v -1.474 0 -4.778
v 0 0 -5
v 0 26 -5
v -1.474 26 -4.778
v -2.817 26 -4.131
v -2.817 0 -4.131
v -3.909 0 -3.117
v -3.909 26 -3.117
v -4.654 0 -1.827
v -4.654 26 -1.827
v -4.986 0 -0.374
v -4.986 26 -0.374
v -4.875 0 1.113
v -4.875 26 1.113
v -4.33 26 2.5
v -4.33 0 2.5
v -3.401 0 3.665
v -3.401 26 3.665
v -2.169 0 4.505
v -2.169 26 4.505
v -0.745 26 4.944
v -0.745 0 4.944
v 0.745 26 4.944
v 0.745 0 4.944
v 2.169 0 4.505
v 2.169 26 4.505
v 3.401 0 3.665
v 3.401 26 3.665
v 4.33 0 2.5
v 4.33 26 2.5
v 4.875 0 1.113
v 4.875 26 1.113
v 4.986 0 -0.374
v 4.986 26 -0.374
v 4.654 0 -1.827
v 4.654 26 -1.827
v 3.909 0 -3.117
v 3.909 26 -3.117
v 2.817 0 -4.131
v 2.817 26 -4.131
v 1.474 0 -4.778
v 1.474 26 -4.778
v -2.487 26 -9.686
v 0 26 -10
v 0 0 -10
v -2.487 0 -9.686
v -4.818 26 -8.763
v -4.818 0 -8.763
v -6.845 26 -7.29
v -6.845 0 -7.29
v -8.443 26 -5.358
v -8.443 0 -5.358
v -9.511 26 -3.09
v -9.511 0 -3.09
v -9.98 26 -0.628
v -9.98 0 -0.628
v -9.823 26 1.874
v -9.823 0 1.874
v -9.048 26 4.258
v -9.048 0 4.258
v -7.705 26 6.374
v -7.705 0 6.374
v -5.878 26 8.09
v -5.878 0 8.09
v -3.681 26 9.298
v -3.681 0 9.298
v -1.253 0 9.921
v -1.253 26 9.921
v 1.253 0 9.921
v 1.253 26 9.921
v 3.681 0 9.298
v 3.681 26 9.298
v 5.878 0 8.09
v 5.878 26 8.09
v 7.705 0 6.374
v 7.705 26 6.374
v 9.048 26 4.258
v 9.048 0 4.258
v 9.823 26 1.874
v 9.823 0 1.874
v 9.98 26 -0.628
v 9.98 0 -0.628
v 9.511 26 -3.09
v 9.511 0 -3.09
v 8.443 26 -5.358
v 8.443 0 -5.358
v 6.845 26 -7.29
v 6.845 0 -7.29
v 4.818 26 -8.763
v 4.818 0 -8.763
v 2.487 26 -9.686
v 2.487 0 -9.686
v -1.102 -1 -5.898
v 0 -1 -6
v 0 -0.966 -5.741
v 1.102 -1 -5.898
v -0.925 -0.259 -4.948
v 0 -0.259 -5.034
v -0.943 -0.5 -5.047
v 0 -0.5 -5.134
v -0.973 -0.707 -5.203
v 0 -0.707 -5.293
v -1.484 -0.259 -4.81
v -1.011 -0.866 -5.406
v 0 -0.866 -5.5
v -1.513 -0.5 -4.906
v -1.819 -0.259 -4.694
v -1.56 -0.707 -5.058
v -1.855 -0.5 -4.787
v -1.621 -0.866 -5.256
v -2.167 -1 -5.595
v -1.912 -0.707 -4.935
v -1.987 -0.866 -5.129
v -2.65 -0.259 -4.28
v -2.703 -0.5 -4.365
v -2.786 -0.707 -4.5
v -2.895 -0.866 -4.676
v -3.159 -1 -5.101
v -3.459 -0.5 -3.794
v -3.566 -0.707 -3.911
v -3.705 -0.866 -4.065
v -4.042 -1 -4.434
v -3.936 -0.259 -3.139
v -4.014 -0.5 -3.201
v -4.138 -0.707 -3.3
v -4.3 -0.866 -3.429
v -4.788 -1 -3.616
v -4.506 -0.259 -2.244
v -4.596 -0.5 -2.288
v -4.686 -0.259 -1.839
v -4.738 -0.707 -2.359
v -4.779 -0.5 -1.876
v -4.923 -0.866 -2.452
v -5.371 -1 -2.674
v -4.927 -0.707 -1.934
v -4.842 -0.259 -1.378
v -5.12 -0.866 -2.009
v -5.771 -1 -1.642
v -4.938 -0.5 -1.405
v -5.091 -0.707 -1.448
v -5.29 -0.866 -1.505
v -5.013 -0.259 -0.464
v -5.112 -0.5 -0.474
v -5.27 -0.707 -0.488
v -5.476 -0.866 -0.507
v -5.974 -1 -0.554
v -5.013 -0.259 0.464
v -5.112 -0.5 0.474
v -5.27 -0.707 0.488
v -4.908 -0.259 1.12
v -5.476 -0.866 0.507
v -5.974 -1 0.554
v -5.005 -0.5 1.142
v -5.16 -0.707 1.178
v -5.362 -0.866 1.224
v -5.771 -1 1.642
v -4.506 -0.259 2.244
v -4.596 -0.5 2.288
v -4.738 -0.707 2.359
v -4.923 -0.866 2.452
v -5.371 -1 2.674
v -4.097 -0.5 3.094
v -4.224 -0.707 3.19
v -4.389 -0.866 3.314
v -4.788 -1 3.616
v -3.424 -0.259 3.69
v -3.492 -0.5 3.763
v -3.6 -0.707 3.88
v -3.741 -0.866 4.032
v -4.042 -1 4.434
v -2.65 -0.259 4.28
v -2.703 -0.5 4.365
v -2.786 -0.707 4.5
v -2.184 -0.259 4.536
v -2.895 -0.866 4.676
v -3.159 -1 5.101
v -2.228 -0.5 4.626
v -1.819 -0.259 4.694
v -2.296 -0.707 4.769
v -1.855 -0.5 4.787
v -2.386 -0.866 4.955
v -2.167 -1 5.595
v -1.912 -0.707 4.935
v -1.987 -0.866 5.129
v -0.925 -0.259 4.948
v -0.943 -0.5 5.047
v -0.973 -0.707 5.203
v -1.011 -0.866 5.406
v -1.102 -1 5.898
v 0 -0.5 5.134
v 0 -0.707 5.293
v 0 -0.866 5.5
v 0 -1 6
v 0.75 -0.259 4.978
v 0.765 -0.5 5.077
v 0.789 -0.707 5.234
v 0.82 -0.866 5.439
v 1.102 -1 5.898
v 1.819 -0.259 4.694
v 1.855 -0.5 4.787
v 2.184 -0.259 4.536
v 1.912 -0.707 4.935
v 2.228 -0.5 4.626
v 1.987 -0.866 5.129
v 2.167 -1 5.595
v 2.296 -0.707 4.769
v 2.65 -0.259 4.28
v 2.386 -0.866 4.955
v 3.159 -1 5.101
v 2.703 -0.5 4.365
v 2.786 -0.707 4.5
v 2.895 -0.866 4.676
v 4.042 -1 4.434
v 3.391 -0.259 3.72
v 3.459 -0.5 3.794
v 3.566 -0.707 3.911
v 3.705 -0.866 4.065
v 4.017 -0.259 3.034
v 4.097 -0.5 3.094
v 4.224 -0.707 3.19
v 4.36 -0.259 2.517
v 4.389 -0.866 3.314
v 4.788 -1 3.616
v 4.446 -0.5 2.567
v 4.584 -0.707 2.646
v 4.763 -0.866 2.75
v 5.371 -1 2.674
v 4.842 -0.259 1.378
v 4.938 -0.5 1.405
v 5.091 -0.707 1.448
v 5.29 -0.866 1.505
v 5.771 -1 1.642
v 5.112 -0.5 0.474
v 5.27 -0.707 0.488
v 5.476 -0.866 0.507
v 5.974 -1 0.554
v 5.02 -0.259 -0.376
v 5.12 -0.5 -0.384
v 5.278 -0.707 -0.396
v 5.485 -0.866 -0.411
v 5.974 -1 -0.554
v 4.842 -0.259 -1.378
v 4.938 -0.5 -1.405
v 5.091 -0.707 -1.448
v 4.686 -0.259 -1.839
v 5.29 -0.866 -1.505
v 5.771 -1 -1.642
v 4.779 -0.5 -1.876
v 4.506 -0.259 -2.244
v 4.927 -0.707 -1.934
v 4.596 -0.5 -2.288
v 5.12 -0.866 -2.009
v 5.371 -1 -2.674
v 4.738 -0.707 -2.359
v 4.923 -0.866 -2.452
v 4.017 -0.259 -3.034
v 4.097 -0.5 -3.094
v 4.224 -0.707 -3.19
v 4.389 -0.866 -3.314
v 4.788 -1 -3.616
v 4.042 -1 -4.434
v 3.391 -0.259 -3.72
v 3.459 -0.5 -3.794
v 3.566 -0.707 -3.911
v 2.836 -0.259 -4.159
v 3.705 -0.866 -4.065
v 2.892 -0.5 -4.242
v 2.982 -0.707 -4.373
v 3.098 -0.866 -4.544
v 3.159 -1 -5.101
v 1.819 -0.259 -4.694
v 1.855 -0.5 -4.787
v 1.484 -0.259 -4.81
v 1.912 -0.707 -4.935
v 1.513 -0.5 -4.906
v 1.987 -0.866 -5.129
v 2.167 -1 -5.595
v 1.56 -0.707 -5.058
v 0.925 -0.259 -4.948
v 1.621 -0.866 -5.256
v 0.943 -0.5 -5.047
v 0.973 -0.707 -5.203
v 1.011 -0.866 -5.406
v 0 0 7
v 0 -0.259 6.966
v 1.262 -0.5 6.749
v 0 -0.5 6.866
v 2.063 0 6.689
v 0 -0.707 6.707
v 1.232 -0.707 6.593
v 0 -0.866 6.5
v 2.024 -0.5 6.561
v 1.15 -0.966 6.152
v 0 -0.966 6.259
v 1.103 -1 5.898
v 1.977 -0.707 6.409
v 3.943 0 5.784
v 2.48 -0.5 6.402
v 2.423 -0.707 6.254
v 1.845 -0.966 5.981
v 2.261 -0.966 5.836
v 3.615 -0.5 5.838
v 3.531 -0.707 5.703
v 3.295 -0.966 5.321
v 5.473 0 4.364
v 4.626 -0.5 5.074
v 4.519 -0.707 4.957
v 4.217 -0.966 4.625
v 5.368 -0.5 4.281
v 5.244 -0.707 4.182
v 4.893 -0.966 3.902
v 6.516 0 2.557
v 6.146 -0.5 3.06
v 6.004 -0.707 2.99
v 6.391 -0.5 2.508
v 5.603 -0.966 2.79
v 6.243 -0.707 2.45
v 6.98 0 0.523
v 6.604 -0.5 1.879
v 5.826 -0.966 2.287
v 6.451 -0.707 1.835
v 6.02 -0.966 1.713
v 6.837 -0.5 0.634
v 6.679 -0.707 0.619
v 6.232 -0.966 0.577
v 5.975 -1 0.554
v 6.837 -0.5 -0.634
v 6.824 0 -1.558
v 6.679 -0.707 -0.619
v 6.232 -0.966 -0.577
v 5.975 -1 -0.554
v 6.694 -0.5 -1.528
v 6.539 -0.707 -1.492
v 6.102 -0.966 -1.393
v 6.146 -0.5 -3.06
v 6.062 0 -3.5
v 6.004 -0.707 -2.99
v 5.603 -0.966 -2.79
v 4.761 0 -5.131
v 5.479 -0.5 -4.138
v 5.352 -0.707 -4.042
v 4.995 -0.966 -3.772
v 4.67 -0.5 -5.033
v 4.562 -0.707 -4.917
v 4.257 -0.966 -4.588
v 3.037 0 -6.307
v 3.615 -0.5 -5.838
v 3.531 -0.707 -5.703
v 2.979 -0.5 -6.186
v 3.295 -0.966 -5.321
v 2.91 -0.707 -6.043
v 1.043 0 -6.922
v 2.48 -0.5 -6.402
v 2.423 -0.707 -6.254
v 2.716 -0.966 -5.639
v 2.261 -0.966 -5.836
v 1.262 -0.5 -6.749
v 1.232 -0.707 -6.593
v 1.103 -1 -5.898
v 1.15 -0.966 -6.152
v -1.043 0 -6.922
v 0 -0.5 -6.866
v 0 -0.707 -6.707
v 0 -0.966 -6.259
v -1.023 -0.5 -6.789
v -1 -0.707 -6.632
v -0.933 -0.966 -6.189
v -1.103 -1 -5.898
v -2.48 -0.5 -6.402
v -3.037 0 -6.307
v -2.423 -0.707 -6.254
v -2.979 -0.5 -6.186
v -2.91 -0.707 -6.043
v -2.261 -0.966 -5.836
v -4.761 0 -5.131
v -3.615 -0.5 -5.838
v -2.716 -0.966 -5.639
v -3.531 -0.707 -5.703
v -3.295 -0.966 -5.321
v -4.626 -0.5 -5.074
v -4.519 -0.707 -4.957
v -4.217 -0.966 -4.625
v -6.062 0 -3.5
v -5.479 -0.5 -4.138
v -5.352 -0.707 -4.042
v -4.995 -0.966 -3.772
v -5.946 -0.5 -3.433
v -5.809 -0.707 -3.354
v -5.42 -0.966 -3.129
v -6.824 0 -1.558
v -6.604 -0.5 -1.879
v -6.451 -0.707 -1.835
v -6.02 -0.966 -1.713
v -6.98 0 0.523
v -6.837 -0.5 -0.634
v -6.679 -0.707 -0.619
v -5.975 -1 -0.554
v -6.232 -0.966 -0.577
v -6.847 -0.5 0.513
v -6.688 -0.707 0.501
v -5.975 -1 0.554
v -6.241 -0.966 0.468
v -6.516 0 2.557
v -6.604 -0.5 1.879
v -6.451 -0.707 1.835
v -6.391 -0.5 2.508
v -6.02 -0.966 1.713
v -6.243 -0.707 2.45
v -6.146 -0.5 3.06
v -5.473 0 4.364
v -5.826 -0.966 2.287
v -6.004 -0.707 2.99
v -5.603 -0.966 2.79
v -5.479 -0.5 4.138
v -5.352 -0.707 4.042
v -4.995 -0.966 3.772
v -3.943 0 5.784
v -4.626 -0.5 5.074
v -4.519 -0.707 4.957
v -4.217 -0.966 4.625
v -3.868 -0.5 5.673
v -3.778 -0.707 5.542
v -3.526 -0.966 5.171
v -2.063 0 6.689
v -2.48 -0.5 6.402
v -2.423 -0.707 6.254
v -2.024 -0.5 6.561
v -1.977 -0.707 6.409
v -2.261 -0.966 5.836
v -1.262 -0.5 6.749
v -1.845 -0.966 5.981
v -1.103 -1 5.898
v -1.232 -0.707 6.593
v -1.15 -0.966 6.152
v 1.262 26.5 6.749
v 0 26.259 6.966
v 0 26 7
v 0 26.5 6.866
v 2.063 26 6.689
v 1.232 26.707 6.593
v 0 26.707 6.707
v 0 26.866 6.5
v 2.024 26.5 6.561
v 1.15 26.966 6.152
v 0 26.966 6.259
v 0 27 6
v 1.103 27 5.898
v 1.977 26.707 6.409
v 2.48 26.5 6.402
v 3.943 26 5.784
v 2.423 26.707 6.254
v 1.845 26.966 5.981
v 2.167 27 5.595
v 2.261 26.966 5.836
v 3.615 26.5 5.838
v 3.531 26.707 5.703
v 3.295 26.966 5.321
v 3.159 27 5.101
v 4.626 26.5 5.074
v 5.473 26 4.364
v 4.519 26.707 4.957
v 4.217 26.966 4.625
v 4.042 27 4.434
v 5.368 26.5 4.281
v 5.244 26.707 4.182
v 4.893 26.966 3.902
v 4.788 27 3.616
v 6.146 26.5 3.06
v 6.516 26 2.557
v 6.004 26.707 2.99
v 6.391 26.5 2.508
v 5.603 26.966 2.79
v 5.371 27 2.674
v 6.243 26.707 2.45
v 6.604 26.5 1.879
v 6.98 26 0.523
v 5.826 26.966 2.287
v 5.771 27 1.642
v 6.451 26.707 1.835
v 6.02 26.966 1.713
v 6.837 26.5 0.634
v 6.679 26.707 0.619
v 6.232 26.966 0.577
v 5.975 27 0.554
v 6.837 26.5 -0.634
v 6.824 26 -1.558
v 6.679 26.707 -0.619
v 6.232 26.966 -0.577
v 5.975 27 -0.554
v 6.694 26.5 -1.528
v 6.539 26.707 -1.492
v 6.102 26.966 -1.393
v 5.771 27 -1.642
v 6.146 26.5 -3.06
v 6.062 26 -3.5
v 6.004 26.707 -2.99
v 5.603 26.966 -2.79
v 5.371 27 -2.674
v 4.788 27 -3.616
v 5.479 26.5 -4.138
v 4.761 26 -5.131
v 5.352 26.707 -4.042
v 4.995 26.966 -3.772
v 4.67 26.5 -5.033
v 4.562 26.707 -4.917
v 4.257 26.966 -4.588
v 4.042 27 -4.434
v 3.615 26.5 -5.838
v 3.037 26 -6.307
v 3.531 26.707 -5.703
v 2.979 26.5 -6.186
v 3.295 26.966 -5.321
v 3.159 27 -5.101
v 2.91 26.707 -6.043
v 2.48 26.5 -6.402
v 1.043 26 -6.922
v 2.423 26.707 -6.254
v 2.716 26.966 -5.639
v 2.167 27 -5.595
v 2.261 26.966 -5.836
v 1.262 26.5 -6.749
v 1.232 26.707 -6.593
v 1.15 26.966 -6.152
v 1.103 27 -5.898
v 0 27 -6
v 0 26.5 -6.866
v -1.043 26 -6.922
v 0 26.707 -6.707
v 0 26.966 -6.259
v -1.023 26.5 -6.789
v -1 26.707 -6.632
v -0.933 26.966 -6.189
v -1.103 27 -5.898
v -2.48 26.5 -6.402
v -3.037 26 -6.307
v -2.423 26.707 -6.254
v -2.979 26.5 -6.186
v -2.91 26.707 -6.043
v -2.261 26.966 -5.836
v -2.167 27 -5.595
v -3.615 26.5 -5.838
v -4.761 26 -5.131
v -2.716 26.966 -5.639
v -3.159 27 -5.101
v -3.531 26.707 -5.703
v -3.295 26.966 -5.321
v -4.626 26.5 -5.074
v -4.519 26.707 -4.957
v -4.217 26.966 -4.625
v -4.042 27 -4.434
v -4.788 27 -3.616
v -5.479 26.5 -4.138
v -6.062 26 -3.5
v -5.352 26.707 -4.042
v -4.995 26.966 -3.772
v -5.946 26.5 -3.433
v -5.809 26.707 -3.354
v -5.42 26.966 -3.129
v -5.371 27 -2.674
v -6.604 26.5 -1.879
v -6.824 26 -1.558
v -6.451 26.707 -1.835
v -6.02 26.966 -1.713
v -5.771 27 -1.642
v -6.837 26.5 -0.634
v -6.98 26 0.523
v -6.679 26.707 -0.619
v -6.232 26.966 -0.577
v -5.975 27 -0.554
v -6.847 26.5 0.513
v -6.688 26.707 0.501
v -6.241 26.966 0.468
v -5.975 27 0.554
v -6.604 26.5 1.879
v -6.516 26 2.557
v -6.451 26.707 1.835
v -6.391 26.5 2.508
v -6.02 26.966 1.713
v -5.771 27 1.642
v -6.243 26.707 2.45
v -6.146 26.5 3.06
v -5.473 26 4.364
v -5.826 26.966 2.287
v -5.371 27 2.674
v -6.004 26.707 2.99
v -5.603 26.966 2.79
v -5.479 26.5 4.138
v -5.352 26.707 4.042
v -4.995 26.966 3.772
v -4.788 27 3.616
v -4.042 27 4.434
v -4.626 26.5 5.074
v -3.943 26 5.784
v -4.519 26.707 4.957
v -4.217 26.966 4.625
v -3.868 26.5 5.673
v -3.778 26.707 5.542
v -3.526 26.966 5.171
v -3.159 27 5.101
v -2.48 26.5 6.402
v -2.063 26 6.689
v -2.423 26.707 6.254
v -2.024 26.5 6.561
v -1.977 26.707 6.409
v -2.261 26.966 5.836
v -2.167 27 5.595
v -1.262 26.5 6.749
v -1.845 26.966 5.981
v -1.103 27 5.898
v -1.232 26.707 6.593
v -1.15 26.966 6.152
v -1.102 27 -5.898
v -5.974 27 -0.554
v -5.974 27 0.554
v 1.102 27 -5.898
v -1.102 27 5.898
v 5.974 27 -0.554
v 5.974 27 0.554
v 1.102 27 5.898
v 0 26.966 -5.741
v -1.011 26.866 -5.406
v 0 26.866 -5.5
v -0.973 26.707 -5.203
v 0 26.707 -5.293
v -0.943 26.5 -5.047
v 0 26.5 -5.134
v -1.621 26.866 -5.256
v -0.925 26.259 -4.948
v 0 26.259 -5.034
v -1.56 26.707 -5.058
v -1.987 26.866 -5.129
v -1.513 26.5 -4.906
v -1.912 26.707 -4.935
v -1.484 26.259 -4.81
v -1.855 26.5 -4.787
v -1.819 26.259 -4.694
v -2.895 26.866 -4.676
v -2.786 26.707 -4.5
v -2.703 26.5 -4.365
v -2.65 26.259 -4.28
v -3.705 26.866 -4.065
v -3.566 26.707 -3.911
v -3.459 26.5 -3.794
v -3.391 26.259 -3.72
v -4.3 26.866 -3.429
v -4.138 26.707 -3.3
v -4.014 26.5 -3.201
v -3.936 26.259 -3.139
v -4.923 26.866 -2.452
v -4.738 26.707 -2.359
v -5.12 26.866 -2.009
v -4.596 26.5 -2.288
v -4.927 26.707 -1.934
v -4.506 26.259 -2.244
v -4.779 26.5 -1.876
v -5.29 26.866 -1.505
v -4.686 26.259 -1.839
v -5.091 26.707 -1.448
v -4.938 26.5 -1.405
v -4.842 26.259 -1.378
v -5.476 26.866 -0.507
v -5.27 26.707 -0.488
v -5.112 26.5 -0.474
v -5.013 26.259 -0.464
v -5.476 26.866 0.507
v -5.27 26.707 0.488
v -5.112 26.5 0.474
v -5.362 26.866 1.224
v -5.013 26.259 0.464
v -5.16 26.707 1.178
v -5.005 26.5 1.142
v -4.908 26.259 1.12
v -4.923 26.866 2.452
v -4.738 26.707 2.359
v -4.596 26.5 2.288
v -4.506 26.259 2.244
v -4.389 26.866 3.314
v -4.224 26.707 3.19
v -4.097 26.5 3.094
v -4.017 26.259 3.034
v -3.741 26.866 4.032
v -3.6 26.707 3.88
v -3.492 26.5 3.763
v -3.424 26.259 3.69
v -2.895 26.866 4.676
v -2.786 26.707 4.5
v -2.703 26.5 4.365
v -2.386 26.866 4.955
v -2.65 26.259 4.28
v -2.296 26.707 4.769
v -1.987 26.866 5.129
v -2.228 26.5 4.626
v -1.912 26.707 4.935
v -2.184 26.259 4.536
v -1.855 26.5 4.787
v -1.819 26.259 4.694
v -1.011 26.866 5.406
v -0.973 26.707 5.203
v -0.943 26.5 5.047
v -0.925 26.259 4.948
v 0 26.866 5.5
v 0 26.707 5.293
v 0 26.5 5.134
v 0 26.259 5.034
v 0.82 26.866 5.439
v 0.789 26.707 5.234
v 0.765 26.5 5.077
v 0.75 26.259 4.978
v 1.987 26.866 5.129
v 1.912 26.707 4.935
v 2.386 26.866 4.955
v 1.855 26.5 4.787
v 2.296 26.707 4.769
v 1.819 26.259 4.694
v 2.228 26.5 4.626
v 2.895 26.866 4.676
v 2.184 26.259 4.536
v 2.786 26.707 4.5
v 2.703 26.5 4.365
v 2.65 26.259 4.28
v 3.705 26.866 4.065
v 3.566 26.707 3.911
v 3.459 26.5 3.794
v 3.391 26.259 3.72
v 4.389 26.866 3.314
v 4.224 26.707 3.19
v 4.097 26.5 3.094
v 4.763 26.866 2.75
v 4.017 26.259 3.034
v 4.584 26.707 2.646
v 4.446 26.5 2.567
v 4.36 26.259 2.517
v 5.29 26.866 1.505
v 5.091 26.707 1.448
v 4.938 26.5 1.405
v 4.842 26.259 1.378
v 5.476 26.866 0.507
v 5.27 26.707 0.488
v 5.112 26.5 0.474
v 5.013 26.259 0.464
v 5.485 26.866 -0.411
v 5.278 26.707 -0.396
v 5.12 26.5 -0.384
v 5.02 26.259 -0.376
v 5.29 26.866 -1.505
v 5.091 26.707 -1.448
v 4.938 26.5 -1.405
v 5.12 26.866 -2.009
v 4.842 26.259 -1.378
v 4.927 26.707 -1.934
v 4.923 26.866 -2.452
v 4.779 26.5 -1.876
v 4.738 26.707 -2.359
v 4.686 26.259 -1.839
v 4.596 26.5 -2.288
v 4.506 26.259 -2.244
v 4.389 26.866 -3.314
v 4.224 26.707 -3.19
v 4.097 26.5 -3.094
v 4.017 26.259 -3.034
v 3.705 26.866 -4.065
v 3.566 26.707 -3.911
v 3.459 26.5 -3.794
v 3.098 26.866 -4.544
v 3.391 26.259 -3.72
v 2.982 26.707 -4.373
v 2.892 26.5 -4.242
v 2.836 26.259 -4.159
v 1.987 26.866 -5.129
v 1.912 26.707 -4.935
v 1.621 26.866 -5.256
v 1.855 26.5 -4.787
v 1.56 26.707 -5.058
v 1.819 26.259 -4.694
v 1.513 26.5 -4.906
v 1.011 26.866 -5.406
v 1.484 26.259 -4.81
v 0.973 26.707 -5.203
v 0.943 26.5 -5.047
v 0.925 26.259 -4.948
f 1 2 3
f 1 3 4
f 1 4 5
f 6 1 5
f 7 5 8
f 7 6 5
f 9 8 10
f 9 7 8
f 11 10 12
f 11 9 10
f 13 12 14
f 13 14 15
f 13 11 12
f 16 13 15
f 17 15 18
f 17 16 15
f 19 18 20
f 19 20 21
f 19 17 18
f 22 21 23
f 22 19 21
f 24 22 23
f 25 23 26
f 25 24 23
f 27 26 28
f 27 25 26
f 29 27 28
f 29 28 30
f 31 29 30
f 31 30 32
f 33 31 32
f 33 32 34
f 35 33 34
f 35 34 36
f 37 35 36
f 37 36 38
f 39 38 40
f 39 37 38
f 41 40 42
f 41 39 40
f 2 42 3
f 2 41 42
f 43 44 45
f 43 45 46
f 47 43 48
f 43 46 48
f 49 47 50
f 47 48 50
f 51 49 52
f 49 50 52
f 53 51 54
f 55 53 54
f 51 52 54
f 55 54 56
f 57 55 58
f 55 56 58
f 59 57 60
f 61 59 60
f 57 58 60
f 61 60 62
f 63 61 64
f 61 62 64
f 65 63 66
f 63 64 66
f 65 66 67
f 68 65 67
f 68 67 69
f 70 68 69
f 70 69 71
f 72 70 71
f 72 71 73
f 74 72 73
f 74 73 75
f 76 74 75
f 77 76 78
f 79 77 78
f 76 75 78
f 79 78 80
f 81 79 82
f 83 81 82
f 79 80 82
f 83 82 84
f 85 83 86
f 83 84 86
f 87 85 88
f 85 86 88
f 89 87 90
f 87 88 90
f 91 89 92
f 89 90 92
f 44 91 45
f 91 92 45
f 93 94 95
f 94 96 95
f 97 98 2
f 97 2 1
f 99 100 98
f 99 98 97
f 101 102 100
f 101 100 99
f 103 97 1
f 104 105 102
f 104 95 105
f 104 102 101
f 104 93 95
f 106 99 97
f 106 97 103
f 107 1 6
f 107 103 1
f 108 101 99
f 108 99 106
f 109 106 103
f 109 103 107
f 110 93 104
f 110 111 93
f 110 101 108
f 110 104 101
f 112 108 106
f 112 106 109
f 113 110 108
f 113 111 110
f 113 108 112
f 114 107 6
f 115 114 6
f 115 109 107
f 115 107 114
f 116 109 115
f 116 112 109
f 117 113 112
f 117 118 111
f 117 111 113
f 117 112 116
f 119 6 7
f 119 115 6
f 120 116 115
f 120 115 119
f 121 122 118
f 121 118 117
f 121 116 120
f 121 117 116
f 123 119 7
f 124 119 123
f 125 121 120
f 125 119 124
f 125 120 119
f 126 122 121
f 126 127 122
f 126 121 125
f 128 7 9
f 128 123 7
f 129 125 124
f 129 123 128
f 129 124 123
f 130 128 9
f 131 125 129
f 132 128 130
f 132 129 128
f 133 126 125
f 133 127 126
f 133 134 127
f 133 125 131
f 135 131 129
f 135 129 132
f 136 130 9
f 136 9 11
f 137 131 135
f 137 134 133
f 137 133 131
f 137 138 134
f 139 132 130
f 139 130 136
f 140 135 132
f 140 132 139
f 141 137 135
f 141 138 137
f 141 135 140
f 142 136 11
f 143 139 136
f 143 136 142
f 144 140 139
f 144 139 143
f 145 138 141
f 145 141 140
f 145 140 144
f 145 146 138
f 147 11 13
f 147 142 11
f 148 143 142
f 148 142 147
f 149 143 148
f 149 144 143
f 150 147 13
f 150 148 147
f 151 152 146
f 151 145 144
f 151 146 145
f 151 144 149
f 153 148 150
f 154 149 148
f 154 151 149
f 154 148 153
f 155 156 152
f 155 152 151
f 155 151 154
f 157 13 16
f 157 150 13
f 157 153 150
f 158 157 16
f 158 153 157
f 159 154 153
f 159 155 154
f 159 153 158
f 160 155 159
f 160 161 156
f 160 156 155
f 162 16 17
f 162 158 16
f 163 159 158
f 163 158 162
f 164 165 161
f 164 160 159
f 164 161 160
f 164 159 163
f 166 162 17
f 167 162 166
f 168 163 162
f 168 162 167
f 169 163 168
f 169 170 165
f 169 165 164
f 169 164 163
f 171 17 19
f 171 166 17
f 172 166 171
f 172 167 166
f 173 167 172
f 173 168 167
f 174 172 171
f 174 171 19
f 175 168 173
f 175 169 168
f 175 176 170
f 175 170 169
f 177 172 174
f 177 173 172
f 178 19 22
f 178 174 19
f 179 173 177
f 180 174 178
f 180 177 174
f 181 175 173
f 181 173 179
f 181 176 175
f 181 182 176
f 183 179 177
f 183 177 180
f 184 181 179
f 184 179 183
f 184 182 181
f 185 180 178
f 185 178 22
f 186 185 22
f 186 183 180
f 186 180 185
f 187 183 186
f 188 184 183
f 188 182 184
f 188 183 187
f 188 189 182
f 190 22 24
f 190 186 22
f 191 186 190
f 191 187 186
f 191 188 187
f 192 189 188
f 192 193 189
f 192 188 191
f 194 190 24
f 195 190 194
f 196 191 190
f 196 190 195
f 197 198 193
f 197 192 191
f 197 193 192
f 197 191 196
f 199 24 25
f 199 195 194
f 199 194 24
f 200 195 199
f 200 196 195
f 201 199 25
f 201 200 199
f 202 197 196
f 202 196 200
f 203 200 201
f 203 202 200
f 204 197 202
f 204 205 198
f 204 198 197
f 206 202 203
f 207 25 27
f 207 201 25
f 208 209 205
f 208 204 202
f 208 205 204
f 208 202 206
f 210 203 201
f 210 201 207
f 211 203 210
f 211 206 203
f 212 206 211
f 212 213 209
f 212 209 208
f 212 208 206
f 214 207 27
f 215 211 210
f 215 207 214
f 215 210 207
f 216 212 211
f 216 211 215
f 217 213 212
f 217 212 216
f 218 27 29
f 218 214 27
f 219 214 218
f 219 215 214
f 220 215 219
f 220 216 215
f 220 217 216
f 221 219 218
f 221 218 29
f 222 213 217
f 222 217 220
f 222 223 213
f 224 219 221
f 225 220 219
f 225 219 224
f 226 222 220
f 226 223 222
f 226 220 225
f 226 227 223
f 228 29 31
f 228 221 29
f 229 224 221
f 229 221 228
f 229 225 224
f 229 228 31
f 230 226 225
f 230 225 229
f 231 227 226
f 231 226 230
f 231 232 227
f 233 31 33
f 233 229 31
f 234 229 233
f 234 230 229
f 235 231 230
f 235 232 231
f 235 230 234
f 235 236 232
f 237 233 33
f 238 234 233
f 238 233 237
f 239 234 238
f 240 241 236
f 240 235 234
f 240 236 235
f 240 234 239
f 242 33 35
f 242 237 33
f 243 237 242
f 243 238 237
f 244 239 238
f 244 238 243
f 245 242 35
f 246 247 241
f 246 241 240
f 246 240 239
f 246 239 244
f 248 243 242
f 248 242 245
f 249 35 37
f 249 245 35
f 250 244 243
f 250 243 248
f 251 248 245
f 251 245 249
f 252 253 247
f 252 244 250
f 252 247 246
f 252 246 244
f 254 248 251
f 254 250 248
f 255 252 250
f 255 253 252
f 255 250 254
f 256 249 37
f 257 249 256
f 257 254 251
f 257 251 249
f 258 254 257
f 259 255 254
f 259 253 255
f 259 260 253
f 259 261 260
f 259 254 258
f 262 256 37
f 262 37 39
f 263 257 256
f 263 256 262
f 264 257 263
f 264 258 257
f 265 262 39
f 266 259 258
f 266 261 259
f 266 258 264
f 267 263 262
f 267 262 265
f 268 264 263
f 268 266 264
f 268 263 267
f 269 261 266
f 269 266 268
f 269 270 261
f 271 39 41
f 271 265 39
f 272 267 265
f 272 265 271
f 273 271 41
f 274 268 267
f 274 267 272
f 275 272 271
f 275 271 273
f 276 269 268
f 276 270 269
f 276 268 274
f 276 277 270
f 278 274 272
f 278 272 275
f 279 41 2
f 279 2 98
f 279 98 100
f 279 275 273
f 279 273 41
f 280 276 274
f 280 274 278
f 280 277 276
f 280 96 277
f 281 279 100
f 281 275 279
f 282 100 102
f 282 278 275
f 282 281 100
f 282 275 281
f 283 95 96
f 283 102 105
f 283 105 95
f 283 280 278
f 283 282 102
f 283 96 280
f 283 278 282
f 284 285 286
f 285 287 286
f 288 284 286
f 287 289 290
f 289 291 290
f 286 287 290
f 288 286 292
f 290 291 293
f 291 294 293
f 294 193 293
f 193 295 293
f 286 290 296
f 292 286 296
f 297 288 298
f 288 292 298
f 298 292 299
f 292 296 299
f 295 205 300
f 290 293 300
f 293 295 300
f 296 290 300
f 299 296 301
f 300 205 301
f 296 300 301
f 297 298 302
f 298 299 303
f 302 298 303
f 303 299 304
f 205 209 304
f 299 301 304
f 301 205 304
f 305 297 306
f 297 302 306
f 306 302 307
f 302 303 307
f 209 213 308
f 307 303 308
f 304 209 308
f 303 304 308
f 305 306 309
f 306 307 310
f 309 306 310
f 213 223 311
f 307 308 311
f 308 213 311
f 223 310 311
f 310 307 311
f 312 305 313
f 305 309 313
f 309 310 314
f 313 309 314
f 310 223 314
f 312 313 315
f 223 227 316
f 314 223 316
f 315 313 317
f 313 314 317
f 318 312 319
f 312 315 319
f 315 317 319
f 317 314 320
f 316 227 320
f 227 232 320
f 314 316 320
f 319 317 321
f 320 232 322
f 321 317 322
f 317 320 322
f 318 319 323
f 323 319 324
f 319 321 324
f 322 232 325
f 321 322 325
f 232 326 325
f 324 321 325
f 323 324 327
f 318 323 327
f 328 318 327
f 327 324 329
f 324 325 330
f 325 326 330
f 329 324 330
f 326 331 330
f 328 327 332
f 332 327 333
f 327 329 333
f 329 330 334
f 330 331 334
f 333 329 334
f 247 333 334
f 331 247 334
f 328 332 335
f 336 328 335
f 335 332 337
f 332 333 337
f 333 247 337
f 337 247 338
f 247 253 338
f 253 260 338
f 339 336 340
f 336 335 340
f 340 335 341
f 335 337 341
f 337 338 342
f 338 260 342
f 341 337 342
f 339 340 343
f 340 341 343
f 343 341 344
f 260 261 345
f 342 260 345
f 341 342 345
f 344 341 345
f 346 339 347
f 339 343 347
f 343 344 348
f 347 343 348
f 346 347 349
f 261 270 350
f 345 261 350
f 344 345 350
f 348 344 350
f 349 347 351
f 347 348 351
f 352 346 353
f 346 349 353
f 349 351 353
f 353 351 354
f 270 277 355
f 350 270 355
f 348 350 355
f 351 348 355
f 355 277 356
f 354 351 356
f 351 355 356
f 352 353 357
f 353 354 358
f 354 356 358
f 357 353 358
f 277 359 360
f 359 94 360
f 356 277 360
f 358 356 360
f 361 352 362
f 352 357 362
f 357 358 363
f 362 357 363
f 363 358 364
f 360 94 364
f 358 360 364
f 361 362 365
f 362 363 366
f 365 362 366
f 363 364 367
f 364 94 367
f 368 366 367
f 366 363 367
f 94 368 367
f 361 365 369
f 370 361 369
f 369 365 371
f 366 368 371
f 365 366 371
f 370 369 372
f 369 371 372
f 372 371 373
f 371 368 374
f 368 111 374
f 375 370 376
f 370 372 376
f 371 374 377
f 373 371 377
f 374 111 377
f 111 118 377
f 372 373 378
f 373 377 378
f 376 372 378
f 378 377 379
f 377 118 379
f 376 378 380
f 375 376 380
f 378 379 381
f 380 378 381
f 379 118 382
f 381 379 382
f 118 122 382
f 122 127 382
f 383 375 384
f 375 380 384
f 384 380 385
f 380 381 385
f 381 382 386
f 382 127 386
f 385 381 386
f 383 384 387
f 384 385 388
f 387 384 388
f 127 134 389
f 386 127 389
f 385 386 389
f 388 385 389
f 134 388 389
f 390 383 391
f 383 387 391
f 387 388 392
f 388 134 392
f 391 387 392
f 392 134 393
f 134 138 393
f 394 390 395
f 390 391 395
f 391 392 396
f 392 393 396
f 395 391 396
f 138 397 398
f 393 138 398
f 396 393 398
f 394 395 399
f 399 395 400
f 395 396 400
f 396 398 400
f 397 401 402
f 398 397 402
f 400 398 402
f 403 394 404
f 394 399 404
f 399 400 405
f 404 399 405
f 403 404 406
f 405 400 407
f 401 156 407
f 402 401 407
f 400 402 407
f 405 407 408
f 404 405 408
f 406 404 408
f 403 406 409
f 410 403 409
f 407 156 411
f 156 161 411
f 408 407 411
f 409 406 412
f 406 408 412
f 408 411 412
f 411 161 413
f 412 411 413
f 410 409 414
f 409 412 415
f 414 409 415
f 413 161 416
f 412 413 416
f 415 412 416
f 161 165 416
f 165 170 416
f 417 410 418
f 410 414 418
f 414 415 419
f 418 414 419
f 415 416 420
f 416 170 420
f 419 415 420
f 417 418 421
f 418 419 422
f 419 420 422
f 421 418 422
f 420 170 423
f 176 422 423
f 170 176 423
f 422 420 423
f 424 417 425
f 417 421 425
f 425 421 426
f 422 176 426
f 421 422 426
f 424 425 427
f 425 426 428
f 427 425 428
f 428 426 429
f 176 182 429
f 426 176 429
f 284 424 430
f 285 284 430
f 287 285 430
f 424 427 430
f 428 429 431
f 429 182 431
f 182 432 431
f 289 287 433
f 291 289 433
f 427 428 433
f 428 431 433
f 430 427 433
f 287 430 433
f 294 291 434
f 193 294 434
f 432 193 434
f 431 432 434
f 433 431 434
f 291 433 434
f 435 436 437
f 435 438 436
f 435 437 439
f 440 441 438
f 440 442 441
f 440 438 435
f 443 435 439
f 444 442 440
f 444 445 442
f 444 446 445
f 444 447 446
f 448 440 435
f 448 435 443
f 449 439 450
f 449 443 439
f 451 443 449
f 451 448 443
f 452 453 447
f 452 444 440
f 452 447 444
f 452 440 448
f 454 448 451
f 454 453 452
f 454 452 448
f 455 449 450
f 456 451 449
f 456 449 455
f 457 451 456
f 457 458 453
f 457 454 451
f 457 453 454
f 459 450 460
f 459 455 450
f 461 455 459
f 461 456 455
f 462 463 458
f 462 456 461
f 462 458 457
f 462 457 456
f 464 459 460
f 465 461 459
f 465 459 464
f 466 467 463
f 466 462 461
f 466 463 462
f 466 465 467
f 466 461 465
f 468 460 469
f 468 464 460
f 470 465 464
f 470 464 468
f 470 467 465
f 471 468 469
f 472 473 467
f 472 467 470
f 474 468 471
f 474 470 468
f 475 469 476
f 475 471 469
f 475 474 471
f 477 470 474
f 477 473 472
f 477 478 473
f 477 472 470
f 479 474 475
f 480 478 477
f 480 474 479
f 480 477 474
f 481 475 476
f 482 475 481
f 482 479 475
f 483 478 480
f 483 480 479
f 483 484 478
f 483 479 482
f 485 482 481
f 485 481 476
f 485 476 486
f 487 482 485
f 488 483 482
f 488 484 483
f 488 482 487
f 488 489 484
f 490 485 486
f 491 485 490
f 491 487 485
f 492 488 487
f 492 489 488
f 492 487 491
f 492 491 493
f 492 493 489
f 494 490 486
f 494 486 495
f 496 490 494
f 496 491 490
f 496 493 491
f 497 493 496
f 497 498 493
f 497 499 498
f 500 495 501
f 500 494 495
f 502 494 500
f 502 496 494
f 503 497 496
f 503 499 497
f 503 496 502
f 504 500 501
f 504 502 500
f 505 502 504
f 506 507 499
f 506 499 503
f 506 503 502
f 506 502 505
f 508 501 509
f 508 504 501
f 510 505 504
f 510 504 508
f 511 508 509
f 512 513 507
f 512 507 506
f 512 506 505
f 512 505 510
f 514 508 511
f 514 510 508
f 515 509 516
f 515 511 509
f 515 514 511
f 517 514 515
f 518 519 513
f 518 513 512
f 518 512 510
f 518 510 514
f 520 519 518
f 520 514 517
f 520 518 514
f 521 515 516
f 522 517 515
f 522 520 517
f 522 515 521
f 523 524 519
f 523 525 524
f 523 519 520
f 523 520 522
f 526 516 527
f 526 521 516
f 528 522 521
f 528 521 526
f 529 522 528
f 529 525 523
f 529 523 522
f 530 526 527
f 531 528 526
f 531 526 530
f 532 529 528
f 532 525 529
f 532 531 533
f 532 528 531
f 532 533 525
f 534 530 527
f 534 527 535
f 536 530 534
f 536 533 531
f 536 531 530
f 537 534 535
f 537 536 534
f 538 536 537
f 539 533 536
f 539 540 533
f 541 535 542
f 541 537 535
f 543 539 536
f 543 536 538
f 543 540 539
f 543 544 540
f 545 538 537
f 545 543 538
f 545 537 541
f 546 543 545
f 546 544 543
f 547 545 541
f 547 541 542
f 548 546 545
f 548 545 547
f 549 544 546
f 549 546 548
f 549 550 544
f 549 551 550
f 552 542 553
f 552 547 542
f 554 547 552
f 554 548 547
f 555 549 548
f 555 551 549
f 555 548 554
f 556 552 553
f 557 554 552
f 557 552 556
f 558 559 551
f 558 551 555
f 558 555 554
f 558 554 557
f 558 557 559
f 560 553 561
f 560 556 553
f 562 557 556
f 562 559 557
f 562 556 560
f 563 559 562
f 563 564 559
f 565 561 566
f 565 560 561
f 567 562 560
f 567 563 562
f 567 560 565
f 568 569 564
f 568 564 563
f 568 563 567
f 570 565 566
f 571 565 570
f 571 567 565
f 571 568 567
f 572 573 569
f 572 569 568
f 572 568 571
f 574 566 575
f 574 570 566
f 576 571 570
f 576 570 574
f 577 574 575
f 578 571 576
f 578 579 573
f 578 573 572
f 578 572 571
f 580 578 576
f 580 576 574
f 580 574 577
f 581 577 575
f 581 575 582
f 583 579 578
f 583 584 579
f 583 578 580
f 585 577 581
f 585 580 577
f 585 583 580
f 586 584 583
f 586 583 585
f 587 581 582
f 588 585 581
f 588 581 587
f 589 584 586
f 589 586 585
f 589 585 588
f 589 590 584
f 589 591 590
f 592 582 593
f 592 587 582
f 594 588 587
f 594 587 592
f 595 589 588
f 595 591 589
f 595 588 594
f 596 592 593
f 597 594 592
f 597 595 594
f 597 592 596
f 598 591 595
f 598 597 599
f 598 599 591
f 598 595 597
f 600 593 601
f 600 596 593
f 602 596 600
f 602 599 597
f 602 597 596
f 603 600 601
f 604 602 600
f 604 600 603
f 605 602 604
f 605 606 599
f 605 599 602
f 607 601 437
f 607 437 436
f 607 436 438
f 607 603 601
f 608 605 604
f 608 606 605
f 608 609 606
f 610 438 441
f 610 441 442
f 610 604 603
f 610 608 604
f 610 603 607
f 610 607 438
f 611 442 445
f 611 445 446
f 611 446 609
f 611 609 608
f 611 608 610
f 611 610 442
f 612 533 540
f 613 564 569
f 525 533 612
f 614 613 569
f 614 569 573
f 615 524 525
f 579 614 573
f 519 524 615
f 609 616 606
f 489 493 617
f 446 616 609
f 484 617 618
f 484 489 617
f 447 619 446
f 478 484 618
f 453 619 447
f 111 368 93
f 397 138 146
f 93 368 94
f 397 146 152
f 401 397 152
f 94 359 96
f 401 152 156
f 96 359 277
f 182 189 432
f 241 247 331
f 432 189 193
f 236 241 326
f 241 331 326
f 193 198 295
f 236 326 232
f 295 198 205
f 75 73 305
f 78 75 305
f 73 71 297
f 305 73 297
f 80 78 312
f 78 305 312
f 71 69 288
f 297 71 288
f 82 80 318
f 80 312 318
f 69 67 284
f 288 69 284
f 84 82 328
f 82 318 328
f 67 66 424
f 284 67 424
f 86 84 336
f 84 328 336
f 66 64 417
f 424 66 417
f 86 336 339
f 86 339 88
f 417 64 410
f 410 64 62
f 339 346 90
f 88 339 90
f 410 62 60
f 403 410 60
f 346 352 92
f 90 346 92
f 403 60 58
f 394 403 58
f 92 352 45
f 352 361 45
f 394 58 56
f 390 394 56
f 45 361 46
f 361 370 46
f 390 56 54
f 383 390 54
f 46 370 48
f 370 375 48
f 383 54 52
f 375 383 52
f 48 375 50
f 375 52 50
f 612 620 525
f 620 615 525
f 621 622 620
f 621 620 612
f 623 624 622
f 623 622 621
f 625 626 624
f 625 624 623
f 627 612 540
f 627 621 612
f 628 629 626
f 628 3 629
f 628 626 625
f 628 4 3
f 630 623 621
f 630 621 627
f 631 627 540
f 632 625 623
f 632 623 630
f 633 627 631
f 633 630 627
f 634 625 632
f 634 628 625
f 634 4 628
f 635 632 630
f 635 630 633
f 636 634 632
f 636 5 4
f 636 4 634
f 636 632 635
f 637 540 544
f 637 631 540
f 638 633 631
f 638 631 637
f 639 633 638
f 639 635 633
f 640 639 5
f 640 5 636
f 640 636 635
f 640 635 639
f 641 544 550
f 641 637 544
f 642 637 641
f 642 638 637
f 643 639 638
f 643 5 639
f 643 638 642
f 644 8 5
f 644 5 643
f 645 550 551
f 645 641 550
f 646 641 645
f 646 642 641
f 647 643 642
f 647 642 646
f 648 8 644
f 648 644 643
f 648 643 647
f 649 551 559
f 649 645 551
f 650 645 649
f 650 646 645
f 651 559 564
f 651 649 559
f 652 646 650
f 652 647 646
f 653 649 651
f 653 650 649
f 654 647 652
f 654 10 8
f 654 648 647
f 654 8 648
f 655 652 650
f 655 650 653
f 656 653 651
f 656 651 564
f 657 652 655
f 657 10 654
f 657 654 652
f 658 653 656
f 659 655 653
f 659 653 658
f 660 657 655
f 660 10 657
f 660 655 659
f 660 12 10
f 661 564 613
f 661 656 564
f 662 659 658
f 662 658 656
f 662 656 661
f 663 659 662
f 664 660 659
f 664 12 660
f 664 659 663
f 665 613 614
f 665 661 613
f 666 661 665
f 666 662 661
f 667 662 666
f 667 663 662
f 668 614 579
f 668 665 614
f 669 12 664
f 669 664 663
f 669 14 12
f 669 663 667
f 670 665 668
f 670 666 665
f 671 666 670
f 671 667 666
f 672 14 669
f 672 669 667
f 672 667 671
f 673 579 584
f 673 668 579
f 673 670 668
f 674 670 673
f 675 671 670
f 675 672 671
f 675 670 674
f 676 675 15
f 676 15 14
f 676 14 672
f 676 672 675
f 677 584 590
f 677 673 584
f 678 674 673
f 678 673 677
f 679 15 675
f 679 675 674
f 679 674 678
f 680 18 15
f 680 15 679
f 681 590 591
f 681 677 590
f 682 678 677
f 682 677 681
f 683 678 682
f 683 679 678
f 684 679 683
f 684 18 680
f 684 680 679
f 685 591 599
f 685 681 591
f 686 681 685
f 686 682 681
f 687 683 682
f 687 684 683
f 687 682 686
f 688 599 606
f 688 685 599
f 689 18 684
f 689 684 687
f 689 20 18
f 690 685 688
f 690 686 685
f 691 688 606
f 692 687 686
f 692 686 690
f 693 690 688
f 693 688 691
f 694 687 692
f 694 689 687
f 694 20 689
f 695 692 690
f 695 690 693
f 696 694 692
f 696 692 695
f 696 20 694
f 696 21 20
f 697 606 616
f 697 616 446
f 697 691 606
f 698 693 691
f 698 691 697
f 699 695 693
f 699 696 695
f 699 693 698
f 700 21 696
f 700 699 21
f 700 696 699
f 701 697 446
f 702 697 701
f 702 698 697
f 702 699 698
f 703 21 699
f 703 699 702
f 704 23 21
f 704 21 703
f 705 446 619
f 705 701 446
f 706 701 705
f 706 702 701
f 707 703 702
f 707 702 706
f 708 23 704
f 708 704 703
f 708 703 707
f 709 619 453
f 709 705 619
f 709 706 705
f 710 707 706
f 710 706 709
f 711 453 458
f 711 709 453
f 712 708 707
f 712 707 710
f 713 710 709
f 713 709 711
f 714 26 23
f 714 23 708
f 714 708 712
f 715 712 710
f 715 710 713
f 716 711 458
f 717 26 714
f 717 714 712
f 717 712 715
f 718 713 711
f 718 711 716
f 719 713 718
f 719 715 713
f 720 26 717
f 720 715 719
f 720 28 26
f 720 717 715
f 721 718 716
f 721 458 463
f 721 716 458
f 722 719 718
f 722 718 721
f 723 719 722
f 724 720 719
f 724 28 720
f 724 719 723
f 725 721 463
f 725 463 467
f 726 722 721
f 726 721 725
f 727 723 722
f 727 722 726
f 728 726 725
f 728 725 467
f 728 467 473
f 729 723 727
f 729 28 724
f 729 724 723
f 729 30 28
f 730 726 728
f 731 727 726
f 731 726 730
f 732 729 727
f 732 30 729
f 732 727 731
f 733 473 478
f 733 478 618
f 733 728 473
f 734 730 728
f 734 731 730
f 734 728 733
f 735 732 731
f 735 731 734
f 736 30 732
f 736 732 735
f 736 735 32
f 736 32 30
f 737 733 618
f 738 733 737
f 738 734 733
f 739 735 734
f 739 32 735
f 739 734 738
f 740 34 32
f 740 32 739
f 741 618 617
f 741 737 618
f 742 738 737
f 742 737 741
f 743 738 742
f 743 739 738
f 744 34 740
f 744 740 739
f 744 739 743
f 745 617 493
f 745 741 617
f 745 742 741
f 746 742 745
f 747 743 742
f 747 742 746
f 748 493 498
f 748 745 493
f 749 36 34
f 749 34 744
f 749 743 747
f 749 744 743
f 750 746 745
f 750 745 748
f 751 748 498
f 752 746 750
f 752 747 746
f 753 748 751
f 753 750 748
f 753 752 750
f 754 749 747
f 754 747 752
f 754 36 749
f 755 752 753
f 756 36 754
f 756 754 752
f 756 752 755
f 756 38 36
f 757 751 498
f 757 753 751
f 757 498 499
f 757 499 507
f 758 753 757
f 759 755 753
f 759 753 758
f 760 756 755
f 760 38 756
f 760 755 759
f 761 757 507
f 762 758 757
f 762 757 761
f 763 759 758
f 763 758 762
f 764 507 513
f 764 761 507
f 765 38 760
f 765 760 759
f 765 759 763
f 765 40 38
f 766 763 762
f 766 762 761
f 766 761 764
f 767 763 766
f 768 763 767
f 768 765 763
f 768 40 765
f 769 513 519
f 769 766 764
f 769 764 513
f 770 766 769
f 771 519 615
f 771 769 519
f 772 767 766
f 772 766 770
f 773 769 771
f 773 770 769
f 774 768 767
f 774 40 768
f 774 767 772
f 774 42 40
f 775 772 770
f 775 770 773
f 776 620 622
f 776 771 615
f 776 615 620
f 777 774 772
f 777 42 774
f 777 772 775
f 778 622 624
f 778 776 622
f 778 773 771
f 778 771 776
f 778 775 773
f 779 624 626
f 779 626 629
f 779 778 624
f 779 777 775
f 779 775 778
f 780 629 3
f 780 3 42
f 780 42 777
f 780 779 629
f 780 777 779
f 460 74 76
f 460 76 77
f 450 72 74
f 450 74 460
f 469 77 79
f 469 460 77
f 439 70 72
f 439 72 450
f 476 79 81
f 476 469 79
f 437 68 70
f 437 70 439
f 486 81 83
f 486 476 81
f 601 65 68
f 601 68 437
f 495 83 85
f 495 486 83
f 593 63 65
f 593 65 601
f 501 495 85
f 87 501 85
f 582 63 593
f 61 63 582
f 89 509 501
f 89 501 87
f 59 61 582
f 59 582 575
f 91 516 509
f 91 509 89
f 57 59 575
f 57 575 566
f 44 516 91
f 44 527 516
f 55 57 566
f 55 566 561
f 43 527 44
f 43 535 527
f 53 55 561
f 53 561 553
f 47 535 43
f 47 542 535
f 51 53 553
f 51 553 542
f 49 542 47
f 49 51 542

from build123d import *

# Parameters (mm, degrees)
PROFILE_SKETCH_R              = 10
PROFILE_SKETCH_R_2            = 5
CYLINDER_EXTRUDE_DEPTH        = 26
LIP_RING_SKETCH_R             = 7
LIP_RING_SKETCH_R_2           = 5
BOTTOM_LIP_RING_EXTRUDE_DEPTH = 1
BOTTOM_RING_FILLET_R          = 1
TOP_START                     = -27
SKETCH2_2_R                   = 7
SKETCH2_2_R_2                 = 5
TOP_LIP_RING_EXTRUDE_DEPTH    = 1
TOP_RING_FILLET_R             = 1


with BuildPart() as part:
    # Profile Sketch → Cylinder Extrude (new body)
    with BuildSketch(Plane(origin=(0, 0, 0), x_dir=(1, 0, 0), z_dir=(0, 1, 0))):
        with Locations(Location((0, 0, 0), (0, 0, 90))):
            Circle(PROFILE_SKETCH_R)
        with Locations(Location((0, 0, 0), (0, 0, 90))):
            Circle(PROFILE_SKETCH_R_2, mode=Mode.SUBTRACT)
    extrude(amount=CYLINDER_EXTRUDE_DEPTH)

    # Lip Ring Sketch → Bottom Lip Ring Extrude (add)
    with BuildSketch(Plane(origin=(0, 26, 0), x_dir=(1, 0, 0), z_dir=(0, 1, 0))):
        with Locations(Location((0, 0, 0), (0, 0, 270))):
            Circle(LIP_RING_SKETCH_R)
        with Locations(Location((0, 0, 0), (0, 0, 90))):
            Circle(LIP_RING_SKETCH_R_2, mode=Mode.SUBTRACT)
    extrude(amount=BOTTOM_LIP_RING_EXTRUDE_DEPTH)

    # Bottom Ring Fillet
    bottom_ring_fillet_edges = [part.edges().sort_by_distance(p)[0] for p in [
        (0, 27, -7),
        (0, 27, 5),
    ]]
    fillet(bottom_ring_fillet_edges, radius=BOTTOM_RING_FILLET_R - 0.0001)  # a hair under: the kernel refuses the full size

    # Sketch2<2> → Top Lip Ring Extrude (add)
    with BuildSketch(Plane(origin=(0, 26, 0), x_dir=(1, 0, 0), z_dir=(0, 1, 0)).offset(TOP_START)):
        with Locations(Location((0, 0, 0), (0, 0, 270))):
            Circle(SKETCH2_2_R)
        with Locations(Location((0, 0, 0), (0, 0, 90))):
            Circle(SKETCH2_2_R_2, mode=Mode.SUBTRACT)
    extrude(amount=TOP_LIP_RING_EXTRUDE_DEPTH)

    # Top Ring Fillet
    top_ring_fillet_edges = [part.edges().sort_by_distance(p)[0] for p in [
        (0, -1, -7),
        (0, -1, 5),
    ]]
    fillet(top_ring_fillet_edges, radius=TOP_RING_FILLET_R - 0.0001)  # a hair under: the kernel refuses the full size


solid = part.part
